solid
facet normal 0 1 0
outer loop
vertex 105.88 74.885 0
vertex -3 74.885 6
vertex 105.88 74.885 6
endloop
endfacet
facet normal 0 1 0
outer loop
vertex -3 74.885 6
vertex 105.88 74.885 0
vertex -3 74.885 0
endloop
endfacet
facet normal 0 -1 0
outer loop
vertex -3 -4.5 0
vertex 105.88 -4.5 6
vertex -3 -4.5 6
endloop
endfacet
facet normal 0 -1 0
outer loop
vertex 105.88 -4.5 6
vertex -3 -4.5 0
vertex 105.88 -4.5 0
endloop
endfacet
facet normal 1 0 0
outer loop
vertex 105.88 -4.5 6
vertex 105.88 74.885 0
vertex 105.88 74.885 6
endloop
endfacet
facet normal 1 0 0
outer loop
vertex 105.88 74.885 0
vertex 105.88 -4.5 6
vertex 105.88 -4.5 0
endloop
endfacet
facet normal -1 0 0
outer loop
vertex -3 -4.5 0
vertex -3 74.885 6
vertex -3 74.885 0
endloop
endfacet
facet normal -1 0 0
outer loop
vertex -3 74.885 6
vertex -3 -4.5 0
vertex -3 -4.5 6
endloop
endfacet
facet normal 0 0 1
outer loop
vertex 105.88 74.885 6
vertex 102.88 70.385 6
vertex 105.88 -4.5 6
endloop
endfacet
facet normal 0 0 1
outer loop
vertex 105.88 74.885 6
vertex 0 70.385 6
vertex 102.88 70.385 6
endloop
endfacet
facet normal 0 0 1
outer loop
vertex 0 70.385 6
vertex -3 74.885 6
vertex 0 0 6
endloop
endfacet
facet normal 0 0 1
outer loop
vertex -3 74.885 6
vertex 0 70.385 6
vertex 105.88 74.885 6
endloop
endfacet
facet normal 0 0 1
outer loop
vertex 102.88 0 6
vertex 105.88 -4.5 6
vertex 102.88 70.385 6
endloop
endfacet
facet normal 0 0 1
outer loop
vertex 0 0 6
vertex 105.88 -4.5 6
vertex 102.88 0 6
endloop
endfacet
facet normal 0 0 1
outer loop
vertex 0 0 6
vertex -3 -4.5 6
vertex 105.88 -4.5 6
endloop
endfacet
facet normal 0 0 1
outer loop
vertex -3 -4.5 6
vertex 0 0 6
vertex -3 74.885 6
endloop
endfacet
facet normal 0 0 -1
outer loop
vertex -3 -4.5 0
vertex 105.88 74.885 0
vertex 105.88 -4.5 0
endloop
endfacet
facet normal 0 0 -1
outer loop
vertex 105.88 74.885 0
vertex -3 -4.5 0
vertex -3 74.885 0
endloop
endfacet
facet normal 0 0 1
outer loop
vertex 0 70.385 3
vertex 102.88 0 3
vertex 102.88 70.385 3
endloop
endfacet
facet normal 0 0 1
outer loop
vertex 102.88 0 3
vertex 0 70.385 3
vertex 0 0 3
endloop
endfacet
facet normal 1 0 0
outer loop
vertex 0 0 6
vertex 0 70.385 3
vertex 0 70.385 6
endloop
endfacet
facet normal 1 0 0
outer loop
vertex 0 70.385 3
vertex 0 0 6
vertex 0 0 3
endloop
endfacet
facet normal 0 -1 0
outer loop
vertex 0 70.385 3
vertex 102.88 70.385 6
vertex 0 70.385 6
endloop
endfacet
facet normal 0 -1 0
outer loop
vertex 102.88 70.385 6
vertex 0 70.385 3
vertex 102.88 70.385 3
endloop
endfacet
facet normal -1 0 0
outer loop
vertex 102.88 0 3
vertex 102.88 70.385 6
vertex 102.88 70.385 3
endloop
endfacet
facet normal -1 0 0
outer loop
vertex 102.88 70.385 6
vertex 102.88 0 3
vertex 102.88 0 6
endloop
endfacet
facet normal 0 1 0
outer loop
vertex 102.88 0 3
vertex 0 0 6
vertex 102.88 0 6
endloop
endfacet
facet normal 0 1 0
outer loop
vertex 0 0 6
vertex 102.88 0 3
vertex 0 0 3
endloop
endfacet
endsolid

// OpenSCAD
epaisseur_support=3;
hauteur_bords=3;
largeur_bords=3;

largeur_carte=70.385;
longueur_carte=102.88;

module carte() {
    square([longueur_carte,largeur_carte]); 
}

module carte_plus_grand() {
minkowski() {
    carte();
    square([2*largeur_bords,3*largeur_bords], center=true);
}
}

module main() {
difference() {
    linear_extrude(height=epaisseur_support+hauteur_bords) carte_plus_grand();
    translate([0,0,epaisseur_support])
    linear_extrude(height=hauteur_bords) carte();
}
}

main();
